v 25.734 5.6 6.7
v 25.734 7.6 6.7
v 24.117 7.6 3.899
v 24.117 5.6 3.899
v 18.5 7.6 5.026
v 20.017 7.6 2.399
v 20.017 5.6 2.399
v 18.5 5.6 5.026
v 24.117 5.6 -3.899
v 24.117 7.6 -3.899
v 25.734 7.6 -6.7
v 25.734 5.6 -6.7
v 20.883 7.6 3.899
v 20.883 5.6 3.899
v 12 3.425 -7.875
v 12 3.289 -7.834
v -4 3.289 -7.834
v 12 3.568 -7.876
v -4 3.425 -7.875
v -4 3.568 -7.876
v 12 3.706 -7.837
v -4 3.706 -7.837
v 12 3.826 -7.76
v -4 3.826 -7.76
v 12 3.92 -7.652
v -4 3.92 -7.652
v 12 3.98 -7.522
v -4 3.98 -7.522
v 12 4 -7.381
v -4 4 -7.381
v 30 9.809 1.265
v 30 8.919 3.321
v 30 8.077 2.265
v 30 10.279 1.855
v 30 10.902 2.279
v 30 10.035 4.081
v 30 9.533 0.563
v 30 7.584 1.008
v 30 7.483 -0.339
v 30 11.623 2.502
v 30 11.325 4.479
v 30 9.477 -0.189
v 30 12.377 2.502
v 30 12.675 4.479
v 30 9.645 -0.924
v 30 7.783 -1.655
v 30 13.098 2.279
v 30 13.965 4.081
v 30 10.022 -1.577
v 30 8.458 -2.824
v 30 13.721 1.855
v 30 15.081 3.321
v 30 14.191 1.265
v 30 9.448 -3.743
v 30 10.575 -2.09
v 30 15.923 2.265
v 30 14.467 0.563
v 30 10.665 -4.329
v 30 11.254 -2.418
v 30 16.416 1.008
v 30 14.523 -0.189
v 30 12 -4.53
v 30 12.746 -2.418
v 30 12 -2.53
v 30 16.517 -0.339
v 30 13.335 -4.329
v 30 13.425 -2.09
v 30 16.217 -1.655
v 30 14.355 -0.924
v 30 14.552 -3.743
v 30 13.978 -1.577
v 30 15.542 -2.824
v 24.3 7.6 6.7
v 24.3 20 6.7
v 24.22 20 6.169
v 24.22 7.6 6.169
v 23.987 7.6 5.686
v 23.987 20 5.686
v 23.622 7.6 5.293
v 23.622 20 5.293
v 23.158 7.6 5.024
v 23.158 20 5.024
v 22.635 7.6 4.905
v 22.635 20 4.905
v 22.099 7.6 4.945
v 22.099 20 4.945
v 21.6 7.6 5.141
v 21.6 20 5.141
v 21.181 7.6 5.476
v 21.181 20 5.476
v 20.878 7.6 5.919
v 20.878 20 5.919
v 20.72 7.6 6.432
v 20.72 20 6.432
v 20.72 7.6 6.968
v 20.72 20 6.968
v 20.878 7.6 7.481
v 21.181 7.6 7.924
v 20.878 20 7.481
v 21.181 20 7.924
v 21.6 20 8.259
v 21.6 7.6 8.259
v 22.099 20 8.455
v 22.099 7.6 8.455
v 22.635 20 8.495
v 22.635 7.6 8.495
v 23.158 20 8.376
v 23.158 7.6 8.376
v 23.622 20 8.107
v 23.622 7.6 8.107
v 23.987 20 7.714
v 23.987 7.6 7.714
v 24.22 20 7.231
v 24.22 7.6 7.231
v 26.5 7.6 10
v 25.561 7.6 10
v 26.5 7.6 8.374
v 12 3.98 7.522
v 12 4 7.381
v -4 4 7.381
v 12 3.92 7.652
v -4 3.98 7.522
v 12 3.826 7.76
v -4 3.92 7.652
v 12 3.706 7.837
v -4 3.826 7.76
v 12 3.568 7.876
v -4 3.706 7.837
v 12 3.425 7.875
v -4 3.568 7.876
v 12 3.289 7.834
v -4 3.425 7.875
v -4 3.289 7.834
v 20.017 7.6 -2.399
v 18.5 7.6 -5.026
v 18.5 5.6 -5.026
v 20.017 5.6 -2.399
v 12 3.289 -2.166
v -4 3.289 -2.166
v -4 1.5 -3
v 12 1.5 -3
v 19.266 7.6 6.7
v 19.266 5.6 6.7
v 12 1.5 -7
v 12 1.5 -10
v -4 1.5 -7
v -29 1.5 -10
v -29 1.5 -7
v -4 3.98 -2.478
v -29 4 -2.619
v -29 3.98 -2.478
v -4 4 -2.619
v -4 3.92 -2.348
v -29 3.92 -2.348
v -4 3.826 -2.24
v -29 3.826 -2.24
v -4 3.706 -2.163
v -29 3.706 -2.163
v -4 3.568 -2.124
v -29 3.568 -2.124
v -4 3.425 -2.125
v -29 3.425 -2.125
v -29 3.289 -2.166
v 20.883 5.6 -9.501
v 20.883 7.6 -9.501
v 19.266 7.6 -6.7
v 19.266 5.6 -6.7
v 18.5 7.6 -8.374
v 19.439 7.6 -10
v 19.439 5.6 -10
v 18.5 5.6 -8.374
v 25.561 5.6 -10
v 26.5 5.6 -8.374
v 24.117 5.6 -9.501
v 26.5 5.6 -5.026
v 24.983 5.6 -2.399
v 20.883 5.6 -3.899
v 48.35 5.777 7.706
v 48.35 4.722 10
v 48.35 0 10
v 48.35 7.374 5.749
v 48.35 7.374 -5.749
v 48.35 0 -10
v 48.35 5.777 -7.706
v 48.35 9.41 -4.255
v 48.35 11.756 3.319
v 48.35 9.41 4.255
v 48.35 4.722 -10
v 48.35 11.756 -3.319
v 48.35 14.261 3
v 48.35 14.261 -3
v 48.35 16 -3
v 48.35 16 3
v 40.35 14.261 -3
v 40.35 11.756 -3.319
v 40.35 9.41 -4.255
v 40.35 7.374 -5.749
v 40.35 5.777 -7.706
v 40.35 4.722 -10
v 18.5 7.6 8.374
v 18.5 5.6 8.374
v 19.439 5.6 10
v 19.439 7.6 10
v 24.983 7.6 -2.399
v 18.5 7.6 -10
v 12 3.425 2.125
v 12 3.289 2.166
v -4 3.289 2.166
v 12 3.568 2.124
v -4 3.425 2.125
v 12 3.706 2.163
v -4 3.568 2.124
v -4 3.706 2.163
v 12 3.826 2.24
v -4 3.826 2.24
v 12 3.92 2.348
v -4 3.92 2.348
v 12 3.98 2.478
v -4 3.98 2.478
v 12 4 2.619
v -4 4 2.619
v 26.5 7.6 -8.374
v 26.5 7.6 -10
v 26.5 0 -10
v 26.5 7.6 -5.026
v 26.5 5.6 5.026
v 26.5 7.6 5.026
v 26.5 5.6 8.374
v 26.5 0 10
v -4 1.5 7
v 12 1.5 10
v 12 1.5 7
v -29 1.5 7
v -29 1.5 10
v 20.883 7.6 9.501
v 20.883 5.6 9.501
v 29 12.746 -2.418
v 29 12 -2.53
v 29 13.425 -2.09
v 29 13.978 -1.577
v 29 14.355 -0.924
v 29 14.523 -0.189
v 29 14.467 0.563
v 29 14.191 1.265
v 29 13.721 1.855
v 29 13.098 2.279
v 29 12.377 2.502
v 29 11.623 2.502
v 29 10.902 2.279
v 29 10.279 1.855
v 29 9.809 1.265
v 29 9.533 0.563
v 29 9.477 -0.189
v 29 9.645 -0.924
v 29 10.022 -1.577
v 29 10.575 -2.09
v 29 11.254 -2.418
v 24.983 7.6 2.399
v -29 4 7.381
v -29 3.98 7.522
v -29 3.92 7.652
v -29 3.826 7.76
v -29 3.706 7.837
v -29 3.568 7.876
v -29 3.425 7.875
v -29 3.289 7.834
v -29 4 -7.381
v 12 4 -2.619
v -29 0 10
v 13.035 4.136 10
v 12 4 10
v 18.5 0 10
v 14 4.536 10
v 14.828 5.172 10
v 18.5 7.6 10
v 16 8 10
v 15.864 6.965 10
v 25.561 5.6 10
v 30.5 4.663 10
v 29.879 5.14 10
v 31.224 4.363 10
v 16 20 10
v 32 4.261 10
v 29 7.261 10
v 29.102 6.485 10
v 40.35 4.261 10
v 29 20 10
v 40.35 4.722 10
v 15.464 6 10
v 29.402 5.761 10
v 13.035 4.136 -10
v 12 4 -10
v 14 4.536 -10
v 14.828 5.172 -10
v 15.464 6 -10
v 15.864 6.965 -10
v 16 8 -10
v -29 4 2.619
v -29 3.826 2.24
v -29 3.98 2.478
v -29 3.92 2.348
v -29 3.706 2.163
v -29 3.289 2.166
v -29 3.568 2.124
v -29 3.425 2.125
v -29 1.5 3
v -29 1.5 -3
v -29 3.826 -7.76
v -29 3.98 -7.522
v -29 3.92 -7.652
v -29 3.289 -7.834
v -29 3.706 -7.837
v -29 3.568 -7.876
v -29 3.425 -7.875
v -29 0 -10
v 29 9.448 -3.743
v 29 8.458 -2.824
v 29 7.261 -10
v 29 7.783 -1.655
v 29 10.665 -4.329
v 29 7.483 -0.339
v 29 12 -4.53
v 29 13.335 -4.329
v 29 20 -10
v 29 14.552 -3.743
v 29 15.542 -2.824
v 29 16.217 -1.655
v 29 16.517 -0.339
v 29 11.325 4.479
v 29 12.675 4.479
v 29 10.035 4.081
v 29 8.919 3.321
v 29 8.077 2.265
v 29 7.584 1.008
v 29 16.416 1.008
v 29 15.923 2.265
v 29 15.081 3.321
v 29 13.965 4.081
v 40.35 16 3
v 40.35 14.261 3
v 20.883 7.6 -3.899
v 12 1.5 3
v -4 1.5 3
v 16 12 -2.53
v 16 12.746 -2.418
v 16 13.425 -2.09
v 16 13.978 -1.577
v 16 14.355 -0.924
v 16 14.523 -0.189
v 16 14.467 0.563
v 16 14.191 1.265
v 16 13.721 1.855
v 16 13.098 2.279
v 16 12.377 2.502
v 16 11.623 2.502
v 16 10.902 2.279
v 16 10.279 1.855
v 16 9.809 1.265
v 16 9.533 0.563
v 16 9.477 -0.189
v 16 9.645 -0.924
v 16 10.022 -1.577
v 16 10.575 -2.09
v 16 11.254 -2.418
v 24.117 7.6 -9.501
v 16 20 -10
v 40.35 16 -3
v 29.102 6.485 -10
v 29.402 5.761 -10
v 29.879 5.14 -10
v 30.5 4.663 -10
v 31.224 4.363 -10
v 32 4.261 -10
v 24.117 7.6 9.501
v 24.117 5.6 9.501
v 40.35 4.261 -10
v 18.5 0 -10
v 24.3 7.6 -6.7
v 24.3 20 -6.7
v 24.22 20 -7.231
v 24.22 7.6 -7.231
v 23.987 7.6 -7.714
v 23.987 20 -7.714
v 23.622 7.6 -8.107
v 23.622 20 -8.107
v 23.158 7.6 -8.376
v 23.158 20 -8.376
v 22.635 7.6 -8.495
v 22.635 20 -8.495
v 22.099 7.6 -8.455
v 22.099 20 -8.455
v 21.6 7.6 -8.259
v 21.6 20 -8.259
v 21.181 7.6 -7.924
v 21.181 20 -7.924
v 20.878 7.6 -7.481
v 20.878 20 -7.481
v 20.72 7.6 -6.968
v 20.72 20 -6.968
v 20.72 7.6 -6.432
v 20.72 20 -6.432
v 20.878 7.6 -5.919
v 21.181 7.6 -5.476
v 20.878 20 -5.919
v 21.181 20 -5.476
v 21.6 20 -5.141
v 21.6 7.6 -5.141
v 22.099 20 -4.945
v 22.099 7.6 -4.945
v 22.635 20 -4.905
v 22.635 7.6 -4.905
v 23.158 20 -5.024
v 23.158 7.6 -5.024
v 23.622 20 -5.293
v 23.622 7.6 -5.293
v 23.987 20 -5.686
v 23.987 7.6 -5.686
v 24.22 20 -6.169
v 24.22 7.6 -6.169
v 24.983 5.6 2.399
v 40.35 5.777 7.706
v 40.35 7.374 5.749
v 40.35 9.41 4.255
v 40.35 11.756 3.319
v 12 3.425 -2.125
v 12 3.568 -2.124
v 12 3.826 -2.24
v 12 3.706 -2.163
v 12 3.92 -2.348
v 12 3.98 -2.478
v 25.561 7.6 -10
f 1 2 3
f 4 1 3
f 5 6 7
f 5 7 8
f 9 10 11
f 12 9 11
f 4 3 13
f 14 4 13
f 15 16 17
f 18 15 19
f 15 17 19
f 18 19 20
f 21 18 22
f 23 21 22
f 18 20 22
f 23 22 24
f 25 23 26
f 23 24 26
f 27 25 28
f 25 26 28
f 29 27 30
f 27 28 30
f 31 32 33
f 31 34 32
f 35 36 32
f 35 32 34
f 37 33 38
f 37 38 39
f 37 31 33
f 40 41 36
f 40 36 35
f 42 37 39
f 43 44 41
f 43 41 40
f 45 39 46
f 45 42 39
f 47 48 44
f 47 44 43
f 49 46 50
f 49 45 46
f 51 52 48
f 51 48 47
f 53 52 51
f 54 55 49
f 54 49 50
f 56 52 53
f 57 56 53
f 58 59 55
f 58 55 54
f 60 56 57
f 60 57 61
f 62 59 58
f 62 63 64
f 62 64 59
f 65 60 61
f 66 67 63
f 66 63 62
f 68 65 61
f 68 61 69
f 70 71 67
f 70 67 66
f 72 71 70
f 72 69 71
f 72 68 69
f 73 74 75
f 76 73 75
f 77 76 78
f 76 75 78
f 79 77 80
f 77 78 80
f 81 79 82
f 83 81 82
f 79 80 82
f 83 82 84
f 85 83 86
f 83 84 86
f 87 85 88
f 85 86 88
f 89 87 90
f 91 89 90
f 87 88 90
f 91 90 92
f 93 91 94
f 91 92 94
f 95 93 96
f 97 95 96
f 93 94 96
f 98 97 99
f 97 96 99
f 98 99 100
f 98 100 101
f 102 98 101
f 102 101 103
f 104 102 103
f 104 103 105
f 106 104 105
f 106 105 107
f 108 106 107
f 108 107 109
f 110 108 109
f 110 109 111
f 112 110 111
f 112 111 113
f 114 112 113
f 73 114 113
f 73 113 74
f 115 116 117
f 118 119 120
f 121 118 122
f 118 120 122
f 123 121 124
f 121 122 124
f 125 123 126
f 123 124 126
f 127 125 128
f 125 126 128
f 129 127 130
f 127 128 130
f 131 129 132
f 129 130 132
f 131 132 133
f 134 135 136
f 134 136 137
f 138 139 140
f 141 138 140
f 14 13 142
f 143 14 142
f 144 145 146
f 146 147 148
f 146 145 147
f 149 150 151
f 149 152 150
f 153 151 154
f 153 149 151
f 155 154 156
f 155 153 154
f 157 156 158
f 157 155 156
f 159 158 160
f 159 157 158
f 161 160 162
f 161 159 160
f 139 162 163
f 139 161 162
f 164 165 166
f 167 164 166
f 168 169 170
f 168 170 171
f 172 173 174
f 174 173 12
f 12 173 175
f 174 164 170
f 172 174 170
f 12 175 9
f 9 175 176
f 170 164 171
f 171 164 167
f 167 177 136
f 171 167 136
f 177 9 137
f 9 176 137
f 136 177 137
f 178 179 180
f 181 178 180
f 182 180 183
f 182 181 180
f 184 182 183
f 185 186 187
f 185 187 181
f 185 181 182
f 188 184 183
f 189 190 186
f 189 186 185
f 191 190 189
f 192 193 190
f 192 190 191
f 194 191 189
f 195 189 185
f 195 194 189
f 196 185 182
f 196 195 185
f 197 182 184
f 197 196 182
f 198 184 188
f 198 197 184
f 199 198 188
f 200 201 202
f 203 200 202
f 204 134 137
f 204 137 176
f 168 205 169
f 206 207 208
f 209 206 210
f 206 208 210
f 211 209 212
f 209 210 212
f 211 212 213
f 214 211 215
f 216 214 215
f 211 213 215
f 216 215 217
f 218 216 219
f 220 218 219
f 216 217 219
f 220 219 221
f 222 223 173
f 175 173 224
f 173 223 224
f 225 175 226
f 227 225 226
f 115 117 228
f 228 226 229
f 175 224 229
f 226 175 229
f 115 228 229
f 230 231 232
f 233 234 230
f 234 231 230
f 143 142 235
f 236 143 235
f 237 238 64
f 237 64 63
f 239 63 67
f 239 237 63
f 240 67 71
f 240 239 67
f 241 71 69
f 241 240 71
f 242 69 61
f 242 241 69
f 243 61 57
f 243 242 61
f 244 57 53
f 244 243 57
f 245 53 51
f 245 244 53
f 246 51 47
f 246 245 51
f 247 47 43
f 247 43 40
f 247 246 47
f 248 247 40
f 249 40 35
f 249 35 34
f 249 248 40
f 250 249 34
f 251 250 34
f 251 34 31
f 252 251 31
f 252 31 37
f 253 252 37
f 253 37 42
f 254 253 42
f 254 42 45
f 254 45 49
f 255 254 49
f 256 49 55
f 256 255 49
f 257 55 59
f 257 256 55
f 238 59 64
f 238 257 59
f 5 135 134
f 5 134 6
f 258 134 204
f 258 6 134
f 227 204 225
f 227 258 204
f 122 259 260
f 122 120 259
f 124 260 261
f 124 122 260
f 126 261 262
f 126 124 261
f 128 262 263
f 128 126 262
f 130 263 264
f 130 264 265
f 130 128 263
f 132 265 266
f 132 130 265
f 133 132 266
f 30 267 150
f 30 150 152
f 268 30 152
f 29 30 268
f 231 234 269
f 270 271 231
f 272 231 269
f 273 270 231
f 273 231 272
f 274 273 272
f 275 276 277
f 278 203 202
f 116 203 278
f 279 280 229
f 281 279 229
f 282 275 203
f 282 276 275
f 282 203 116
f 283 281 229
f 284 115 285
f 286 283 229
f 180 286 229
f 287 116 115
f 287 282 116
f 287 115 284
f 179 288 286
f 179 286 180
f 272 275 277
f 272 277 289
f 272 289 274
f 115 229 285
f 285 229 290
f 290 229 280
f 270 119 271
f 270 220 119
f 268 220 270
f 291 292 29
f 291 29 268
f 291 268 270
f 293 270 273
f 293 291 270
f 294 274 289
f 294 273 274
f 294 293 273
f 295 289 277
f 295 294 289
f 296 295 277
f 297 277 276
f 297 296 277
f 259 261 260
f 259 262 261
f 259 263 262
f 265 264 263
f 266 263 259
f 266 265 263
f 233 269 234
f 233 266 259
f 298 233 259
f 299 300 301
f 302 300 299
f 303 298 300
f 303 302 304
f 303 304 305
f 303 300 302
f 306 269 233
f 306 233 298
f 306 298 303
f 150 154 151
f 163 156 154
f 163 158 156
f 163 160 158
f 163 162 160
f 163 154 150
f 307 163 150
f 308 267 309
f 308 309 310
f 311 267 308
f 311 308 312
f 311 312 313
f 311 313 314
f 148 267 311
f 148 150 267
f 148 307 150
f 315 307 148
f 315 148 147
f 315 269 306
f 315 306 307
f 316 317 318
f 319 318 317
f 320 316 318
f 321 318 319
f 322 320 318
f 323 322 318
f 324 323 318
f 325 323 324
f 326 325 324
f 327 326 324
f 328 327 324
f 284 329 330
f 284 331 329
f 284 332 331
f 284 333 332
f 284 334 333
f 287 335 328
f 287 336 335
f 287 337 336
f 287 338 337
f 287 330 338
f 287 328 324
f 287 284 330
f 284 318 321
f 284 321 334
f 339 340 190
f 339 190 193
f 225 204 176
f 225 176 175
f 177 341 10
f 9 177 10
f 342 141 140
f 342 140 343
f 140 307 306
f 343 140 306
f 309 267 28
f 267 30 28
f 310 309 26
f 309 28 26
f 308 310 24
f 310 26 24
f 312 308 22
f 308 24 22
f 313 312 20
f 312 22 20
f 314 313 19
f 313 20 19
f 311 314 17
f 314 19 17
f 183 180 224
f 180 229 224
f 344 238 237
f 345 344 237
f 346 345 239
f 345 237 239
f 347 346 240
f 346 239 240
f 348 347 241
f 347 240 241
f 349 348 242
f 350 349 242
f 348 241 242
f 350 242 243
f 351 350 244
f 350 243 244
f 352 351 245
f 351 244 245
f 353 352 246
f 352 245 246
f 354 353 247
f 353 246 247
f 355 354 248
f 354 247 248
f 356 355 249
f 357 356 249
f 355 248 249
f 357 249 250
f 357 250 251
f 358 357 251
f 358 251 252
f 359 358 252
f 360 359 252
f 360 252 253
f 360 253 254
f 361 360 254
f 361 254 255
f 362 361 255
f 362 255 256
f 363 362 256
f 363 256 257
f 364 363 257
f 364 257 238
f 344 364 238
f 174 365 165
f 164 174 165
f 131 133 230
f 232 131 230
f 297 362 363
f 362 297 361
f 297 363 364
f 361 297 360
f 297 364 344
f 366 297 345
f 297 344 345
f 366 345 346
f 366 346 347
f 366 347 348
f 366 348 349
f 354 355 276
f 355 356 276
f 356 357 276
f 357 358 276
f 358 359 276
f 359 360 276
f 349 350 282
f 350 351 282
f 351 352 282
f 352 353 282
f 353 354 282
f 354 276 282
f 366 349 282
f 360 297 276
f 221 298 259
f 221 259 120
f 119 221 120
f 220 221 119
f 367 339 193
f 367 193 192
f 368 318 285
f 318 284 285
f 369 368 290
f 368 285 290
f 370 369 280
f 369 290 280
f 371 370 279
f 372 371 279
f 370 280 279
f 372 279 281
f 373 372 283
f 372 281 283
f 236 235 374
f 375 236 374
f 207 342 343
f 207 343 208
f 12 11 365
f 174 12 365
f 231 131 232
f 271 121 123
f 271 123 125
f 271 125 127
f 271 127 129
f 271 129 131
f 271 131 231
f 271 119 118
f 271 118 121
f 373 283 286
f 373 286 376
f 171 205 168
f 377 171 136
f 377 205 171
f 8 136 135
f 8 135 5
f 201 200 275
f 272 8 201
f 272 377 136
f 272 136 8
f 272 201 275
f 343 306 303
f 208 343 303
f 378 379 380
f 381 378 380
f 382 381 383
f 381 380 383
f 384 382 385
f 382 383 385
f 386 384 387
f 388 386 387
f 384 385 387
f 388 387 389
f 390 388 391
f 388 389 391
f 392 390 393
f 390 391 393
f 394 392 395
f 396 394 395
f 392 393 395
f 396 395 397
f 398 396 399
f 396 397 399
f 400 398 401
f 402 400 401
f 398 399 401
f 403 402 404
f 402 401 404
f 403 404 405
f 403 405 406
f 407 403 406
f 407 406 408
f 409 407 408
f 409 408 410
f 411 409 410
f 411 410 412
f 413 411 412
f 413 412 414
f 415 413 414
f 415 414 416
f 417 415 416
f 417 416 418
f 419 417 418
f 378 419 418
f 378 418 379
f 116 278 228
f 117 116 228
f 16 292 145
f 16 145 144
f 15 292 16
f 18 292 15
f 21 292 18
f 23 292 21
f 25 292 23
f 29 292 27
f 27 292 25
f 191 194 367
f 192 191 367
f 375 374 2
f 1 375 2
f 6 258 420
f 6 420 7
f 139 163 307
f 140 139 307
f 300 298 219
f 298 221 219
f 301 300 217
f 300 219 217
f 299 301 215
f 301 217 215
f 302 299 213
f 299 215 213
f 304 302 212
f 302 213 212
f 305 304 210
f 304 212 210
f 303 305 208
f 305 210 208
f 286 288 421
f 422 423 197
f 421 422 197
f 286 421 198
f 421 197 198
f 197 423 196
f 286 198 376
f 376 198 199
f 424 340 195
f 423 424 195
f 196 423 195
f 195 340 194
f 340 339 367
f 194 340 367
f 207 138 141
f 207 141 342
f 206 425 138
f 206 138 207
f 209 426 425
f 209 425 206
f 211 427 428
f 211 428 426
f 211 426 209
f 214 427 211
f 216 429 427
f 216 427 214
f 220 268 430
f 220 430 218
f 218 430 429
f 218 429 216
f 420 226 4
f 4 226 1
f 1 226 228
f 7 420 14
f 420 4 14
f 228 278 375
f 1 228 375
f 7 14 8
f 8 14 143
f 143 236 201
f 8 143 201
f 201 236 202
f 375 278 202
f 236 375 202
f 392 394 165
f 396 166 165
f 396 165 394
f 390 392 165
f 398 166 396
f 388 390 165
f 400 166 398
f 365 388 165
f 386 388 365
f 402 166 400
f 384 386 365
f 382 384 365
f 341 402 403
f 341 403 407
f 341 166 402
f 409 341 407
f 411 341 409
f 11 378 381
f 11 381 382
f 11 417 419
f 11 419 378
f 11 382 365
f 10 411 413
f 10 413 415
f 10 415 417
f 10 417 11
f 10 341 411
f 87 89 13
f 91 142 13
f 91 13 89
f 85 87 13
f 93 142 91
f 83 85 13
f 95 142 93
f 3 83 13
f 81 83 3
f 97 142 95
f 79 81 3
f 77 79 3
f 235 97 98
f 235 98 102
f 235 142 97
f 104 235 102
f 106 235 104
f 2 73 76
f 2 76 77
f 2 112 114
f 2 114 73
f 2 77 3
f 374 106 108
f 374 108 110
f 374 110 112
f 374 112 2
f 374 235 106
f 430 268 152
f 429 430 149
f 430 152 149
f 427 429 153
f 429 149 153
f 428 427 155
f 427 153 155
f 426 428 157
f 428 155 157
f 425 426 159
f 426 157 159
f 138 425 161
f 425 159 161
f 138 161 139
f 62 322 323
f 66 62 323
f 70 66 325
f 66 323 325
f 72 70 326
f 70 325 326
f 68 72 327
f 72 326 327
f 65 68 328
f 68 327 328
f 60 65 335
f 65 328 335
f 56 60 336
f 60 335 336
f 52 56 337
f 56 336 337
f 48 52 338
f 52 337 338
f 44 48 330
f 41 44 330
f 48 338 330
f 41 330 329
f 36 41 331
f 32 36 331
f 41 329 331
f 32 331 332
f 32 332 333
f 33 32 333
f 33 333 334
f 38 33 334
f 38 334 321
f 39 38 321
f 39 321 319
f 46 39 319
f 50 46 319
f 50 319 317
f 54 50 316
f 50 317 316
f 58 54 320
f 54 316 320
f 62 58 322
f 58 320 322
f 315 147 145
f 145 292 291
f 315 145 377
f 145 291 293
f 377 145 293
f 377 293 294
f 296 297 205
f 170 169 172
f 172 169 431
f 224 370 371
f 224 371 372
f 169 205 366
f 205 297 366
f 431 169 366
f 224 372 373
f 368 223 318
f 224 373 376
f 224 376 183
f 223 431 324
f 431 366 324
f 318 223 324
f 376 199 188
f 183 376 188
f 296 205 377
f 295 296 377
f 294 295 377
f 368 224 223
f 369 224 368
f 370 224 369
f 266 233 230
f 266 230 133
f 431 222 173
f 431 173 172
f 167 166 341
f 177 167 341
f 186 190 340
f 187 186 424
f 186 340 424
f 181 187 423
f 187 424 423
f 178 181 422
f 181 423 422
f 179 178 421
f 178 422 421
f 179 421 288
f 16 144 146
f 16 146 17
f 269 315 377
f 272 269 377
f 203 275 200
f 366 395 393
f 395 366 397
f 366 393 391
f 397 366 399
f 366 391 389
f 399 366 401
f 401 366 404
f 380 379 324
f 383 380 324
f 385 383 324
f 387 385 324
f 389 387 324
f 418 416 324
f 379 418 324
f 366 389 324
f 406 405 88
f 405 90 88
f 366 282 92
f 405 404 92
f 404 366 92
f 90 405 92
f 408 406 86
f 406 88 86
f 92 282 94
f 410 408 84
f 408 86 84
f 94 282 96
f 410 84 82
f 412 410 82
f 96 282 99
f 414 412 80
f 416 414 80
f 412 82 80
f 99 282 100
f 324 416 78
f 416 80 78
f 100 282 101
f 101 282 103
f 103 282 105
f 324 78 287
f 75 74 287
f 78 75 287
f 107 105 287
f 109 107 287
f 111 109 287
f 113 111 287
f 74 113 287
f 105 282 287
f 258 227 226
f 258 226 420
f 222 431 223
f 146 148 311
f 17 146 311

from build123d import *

# Parameters (mm, degrees)
SKETCH1_W            = 58
SKETCH1_H            = 80
BOSS_EXTRUDE1_DEPTH  = 4
CUT_EXTRUDE1_DEPTH   = 25
SKETCH5_W            = 13
SKETCH5_H            = 16
BOSS_EXTRUDE3_DEPTH  = 80
SKETCH6_R            = 2.53
CUT_EXTRUDE2_DEPTH   = 59
SKETCH7_R            = 4.53
SKETCH7_R_2          = 2.53
BOSS_EXTRUDE4_DEPTH  = 1
SKETCH8_R            = 1.8
CUT_EXTRUDE3_DEPTH   = 21
SKETCH9_W            = 8
SKETCH9_H            = 80
CUT_EXTRUDE4_DEPTH   = 7.6
SKETCH13_W           = 6
SKETCH13_H           = 4.261
BOSS_EXTRUDE6_DEPTH  = 11.35
SKETCH14_W           = 6
SKETCH14_H           = 16
BOSS_EXTRUDE7_DEPTH  = 8
SKETCH15_W           = 40
SKETCH15_H           = 4.261
BOSS_EXTRUDE8_DEPTH  = 19.35
FILLET1_R            = 10
FILLET2_R            = 3
FILLET3_R            = 3
SKETCH17_W           = 17
SKETCH17_H           = 24
CUT_EXTRUDE6_DEPTH   = 5
FILLET4_R            = 14
FILLET5_R            = 4
FILLET6_R            = 2
FILLET7_R            = 0.5
BOSS_EXTRUDE10_DEPTH = 2
SKETCH19_W           = 58
SKETCH19_H           = 5.571501033
SKETCH19_H_2         = 14.101029475
CUT_EXTRUDE7_DEPTH   = 21
SKETCH20_W           = 96.7
SKETCH20_H           = 30
CUT_EXTRUDE8_DEPTH   = 21.0000001
CUT_EXTRUDE9_DEPTH   = 16


with BuildPart() as part:
    # Sketch1 → Boss-Extrude1 (new body)
    with BuildSketch(Plane(origin=(0, 0, 0), x_dir=(1, 0, 0), z_dir=(0, 1, 0))):
        Rectangle(SKETCH1_W, SKETCH1_H)
    extrude(amount=BOSS_EXTRUDE1_DEPTH)

    # Sketch2 → Cut-Extrude1 (cut)
    with BuildSketch(Plane.ZY.offset(29)):
        Polygon((1.834230855, 4), (-1.834230855, 4), (-3, 1.5), (3, 1.5), align=None)
        Polygon((8.165769145, 4), (11.834230855, 4), (13, 1.5), (7, 1.5), align=None)
        Polygon((-7, 1.5), (-8.165769145, 4), (-11.834230855, 4), (-13, 1.5), align=None)
    extrude(amount=-CUT_EXTRUDE1_DEPTH, mode=Mode.SUBTRACT)

    # Sketch5 → Boss-Extrude3 (add)
    with BuildSketch(Plane.XY.offset(40)):
        with Locations((22.5, 12)):
            Rectangle(SKETCH5_W, SKETCH5_H)
    extrude(amount=-BOSS_EXTRUDE3_DEPTH)

    # Sketch6 → Cut-Extrude2 (cut, through all)
    with BuildSketch(Plane(origin=(29, 0, 0), x_dir=(0, 0, -1), z_dir=(1, 0, 0))):
        with Locations((0, 12)):
            Circle(SKETCH6_R)
    extrude(amount=-CUT_EXTRUDE2_DEPTH, mode=Mode.SUBTRACT)

    # Sketch7 → Boss-Extrude4 (add)
    with BuildSketch(Plane(origin=(29, 0, 0), x_dir=(0, 0, -1), z_dir=(1, 0, 0))):
        with Locations((0, 12)):
            Circle(SKETCH7_R)
        with Locations((0, 12)):
            Circle(SKETCH7_R_2, mode=Mode.SUBTRACT)
    extrude(amount=BOSS_EXTRUDE4_DEPTH)

    # Sketch8 → Cut-Extrude3 (cut, through all)
    with BuildSketch(Plane(origin=(0, 20, 0), x_dir=(1, 0, 0), z_dir=(0, 1, 0))):
        with Locations((22.5, 6.7)):
            Circle(SKETCH8_R)
        with Locations((22.5, -6.7)):
            Circle(SKETCH8_R)
    extrude(amount=-CUT_EXTRUDE3_DEPTH, mode=Mode.SUBTRACT)

    # Sketch9 → Cut-Extrude4 (cut)
    with BuildSketch(Plane.XZ):
        with Locations((22.5, 0)):
            Rectangle(SKETCH9_W, SKETCH9_H)
    extrude(amount=-CUT_EXTRUDE4_DEPTH, mode=Mode.SUBTRACT)

    # Sketch13 → Boss-Extrude6 (add)
    with BuildSketch(Plane(origin=(29, 0, 0), x_dir=(0, 0, -1), z_dir=(1, 0, 0))):
        with Locations((0, 2.1305)):
            Rectangle(SKETCH13_W, SKETCH13_H)
    extrude(amount=BOSS_EXTRUDE6_DEPTH)

    # Sketch14 → Boss-Extrude7 (add)
    with BuildSketch(Plane(origin=(40.35, 0, 0), x_dir=(0, 0, -1), z_dir=(1, 0, 0))):
        with Locations((0, 8)):
            Rectangle(SKETCH14_W, SKETCH14_H)
    extrude(amount=BOSS_EXTRUDE7_DEPTH)

    # Sketch15 → Boss-Extrude8 (add)
    with BuildSketch(Plane(origin=(29, 0, 0), x_dir=(0, 0, -1), z_dir=(1, 0, 0))):
        with Locations((0, 2.1305)):
            Rectangle(SKETCH15_W, SKETCH15_H)
    extrude(amount=BOSS_EXTRUDE8_DEPTH)

    # Fillet1
    fillet1_edges = [part.edges().sort_by_distance(p)[0] for p in [
        (44.35, 4.261, 3),
        (44.35, 4.261, -3),
    ]]
    fillet(fillet1_edges, radius=FILLET1_R)

    # Fillet2
    fillet2_edges = [part.edges().sort_by_distance(p)[0] for p in [
        (29, 4.261, 0),
    ]]
    fillet(fillet2_edges, radius=FILLET2_R)

    # Fillet3
    fillet3_edges = [part.edges().sort_by_distance(p)[0] for p in [
        (29, 2.1305, -20),
        (29, 2.1305, 20),
    ]]
    fillet(fillet3_edges, radius=FILLET3_R)

    # Sketch17 → Cut-Extrude6 (cut, through all)
    with BuildSketch(Plane(origin=(0, 4, 0), x_dir=(1, 0, 0), z_dir=(0, 1, 0))):
        with Locations((7.5, -24)):
            Rectangle(SKETCH17_W, SKETCH17_H)
        with Locations((7.5, 24)):
            Rectangle(SKETCH17_W, SKETCH17_H)
    extrude(amount=-CUT_EXTRUDE6_DEPTH, mode=Mode.SUBTRACT)

    # Fillet4
    fillet4_edges = [part.edges().sort_by_distance(p)[0] for p in [
        (16, 4, 38),
        (16, 4, -38),
    ]]
    fillet(fillet4_edges, radius=FILLET4_R)

    # Fillet5
    fillet5_edges = [part.edges().sort_by_distance(p)[0] for p in [
        (16, 4, 0),
    ]]
    fillet(fillet5_edges, radius=FILLET5_R)

    # Fillet6
    fillet6_edges = [part.edges().sort_by_distance(p)[0] for p in [
        (16, 6, 12),
        (16, 11, 36),
        (16, 11, -36),
        (16, 6, -12),
    ]]
    fillet(fillet6_edges, radius=FILLET6_R)

    # Fillet7
    fillet7_edges = [part.edges().sort_by_distance(p)[0] for p in [
        (-16.5, 4, -11.834230855),
        (-16.5, 4, -8.165769145),
        (-16.5, 4, 8.165769145),
        (-16.5, 4, 11.834230855),
        (-16.5, 4, 1.834230855),
        (-16.5, 4, -1.834230855),
    ]]
    fillet(fillet7_edges, radius=FILLET7_R)

    # Sketch18 → Boss-Extrude10 (add)
    with BuildSketch(Plane.XZ.offset(-7.6)):
        Polygon((20.016762412, 40.30109367), (24.983237588, 40.30109367), (27.466475177, 36), (24.983237588, 31.69890633), (20.016762412, 31.69890633), (17.533524823, 36), align=None)
        Polygon((20.882787815, 38.80109367), (24.117212185, 38.80109367), (25.734424369, 36), (24.117212185, 33.19890633), (20.882787815, 33.19890633), (19.265575631, 36), align=None, mode=Mode.SUBTRACT)
        Polygon((20.016762412, 11.00109367), (24.983237588, 11.00109367), (27.466475177, 6.7), (24.983237588, 2.39890633), (20.016762412, 2.39890633), (17.533524823, 6.7), align=None)
        Polygon((20.882787815, 9.50109367), (24.117212185, 9.50109367), (25.734424369, 6.7), (24.117212185, 3.89890633), (20.882787815, 3.89890633), (19.265575631, 6.7), align=None, mode=Mode.SUBTRACT)
        Polygon((20.016762412, -2.39890633), (24.983237588, -2.39890633), (27.466475177, -6.7), (24.983237588, -11.00109367), (20.016762412, -11.00109367), (17.533524823, -6.7), align=None)
        Polygon((20.882787815, -3.89890633), (24.117212185, -3.89890633), (25.734424369, -6.7), (24.117212185, -9.50109367), (20.882787815, -9.50109367), (19.265575631, -6.7), align=None, mode=Mode.SUBTRACT)
        Polygon((20.016762412, -31.69890633), (24.983237588, -31.69890633), (27.466475177, -36), (24.983237588, -40.30109367), (20.016762412, -40.30109367), (17.533524823, -36), align=None)
        Polygon((20.882787815, -33.19890633), (24.117212185, -33.19890633), (25.734424369, -36), (24.117212185, -38.80109367), (20.882787815, -38.80109367), (19.265575631, -36), align=None, mode=Mode.SUBTRACT)
    extrude(amount=BOSS_EXTRUDE10_DEPTH)

    # Sketch19 → Cut-Extrude7 (cut, through all)
    with BuildSketch(Plane.XZ):
        with Locations((0, -42.785750517)):
            Rectangle(SKETCH19_W, SKETCH19_H)
        with Locations((0, 47.050514738)):
            Rectangle(SKETCH19_W, SKETCH19_H_2)
    extrude(amount=-CUT_EXTRUDE7_DEPTH, mode=Mode.SUBTRACT)

    # Sketch20 → Cut-Extrude8 (cut, through all)
    with BuildSketch(Plane(origin=(0, 20, 0), x_dir=(1, 0, 0), z_dir=(0, 1, 0))):
        with Locations((0, 25)):
            Rectangle(SKETCH20_W, SKETCH20_H)
        with Locations((0, -25)):
            Rectangle(SKETCH20_W, SKETCH20_H)
    extrude(amount=-CUT_EXTRUDE8_DEPTH, mode=Mode.SUBTRACT)

    # Sketch22 → Cut-Extrude9 (cut)
    with BuildSketch(Plane.ZY.offset(4)):
        with BuildLine():
            Line((-10, 4), (-10, 1.5))
            Line((-10, 1.5), (-7, 1.5))
            Line((-7, 1.5), (-7.83408025, 3.288690869))
            ThreePointArc((-7.83408025, 3.288690869), (-7.80262208, 3.768649804), (-7.380926357, 4))
            Line((-7.380926357, 4), (-10, 4))
        make_face()
        with BuildLine():
            Line((3, 1.5), (2.16591975, 3.288690869))
            ThreePointArc((2.16591975, 3.288690869), (2.19737792, 3.768649804), (2.619073643, 4))
            Line((2.619073643, 4), (-2.619073643, 4))
            ThreePointArc((-2.619073643, 4), (-2.19737792, 3.768649804), (-2.16591975, 3.288690869))
            Line((-2.16591975, 3.288690869), (-3, 1.5))
            Line((-3, 1.5), (3, 1.5))
        make_face()
        with BuildLine():
            Line((7, 1.5), (10, 1.5))
            Line((10, 1.5), (10, 4))
            Line((10, 4), (7.380926357, 4))
            ThreePointArc((7.380926357, 4), (7.80262208, 3.768649804), (7.83408025, 3.288690869))
            Line((7.83408025, 3.288690869), (7, 1.5))
        make_face()
    extrude(amount=-CUT_EXTRUDE9_DEPTH, mode=Mode.SUBTRACT)


solid = part.part
